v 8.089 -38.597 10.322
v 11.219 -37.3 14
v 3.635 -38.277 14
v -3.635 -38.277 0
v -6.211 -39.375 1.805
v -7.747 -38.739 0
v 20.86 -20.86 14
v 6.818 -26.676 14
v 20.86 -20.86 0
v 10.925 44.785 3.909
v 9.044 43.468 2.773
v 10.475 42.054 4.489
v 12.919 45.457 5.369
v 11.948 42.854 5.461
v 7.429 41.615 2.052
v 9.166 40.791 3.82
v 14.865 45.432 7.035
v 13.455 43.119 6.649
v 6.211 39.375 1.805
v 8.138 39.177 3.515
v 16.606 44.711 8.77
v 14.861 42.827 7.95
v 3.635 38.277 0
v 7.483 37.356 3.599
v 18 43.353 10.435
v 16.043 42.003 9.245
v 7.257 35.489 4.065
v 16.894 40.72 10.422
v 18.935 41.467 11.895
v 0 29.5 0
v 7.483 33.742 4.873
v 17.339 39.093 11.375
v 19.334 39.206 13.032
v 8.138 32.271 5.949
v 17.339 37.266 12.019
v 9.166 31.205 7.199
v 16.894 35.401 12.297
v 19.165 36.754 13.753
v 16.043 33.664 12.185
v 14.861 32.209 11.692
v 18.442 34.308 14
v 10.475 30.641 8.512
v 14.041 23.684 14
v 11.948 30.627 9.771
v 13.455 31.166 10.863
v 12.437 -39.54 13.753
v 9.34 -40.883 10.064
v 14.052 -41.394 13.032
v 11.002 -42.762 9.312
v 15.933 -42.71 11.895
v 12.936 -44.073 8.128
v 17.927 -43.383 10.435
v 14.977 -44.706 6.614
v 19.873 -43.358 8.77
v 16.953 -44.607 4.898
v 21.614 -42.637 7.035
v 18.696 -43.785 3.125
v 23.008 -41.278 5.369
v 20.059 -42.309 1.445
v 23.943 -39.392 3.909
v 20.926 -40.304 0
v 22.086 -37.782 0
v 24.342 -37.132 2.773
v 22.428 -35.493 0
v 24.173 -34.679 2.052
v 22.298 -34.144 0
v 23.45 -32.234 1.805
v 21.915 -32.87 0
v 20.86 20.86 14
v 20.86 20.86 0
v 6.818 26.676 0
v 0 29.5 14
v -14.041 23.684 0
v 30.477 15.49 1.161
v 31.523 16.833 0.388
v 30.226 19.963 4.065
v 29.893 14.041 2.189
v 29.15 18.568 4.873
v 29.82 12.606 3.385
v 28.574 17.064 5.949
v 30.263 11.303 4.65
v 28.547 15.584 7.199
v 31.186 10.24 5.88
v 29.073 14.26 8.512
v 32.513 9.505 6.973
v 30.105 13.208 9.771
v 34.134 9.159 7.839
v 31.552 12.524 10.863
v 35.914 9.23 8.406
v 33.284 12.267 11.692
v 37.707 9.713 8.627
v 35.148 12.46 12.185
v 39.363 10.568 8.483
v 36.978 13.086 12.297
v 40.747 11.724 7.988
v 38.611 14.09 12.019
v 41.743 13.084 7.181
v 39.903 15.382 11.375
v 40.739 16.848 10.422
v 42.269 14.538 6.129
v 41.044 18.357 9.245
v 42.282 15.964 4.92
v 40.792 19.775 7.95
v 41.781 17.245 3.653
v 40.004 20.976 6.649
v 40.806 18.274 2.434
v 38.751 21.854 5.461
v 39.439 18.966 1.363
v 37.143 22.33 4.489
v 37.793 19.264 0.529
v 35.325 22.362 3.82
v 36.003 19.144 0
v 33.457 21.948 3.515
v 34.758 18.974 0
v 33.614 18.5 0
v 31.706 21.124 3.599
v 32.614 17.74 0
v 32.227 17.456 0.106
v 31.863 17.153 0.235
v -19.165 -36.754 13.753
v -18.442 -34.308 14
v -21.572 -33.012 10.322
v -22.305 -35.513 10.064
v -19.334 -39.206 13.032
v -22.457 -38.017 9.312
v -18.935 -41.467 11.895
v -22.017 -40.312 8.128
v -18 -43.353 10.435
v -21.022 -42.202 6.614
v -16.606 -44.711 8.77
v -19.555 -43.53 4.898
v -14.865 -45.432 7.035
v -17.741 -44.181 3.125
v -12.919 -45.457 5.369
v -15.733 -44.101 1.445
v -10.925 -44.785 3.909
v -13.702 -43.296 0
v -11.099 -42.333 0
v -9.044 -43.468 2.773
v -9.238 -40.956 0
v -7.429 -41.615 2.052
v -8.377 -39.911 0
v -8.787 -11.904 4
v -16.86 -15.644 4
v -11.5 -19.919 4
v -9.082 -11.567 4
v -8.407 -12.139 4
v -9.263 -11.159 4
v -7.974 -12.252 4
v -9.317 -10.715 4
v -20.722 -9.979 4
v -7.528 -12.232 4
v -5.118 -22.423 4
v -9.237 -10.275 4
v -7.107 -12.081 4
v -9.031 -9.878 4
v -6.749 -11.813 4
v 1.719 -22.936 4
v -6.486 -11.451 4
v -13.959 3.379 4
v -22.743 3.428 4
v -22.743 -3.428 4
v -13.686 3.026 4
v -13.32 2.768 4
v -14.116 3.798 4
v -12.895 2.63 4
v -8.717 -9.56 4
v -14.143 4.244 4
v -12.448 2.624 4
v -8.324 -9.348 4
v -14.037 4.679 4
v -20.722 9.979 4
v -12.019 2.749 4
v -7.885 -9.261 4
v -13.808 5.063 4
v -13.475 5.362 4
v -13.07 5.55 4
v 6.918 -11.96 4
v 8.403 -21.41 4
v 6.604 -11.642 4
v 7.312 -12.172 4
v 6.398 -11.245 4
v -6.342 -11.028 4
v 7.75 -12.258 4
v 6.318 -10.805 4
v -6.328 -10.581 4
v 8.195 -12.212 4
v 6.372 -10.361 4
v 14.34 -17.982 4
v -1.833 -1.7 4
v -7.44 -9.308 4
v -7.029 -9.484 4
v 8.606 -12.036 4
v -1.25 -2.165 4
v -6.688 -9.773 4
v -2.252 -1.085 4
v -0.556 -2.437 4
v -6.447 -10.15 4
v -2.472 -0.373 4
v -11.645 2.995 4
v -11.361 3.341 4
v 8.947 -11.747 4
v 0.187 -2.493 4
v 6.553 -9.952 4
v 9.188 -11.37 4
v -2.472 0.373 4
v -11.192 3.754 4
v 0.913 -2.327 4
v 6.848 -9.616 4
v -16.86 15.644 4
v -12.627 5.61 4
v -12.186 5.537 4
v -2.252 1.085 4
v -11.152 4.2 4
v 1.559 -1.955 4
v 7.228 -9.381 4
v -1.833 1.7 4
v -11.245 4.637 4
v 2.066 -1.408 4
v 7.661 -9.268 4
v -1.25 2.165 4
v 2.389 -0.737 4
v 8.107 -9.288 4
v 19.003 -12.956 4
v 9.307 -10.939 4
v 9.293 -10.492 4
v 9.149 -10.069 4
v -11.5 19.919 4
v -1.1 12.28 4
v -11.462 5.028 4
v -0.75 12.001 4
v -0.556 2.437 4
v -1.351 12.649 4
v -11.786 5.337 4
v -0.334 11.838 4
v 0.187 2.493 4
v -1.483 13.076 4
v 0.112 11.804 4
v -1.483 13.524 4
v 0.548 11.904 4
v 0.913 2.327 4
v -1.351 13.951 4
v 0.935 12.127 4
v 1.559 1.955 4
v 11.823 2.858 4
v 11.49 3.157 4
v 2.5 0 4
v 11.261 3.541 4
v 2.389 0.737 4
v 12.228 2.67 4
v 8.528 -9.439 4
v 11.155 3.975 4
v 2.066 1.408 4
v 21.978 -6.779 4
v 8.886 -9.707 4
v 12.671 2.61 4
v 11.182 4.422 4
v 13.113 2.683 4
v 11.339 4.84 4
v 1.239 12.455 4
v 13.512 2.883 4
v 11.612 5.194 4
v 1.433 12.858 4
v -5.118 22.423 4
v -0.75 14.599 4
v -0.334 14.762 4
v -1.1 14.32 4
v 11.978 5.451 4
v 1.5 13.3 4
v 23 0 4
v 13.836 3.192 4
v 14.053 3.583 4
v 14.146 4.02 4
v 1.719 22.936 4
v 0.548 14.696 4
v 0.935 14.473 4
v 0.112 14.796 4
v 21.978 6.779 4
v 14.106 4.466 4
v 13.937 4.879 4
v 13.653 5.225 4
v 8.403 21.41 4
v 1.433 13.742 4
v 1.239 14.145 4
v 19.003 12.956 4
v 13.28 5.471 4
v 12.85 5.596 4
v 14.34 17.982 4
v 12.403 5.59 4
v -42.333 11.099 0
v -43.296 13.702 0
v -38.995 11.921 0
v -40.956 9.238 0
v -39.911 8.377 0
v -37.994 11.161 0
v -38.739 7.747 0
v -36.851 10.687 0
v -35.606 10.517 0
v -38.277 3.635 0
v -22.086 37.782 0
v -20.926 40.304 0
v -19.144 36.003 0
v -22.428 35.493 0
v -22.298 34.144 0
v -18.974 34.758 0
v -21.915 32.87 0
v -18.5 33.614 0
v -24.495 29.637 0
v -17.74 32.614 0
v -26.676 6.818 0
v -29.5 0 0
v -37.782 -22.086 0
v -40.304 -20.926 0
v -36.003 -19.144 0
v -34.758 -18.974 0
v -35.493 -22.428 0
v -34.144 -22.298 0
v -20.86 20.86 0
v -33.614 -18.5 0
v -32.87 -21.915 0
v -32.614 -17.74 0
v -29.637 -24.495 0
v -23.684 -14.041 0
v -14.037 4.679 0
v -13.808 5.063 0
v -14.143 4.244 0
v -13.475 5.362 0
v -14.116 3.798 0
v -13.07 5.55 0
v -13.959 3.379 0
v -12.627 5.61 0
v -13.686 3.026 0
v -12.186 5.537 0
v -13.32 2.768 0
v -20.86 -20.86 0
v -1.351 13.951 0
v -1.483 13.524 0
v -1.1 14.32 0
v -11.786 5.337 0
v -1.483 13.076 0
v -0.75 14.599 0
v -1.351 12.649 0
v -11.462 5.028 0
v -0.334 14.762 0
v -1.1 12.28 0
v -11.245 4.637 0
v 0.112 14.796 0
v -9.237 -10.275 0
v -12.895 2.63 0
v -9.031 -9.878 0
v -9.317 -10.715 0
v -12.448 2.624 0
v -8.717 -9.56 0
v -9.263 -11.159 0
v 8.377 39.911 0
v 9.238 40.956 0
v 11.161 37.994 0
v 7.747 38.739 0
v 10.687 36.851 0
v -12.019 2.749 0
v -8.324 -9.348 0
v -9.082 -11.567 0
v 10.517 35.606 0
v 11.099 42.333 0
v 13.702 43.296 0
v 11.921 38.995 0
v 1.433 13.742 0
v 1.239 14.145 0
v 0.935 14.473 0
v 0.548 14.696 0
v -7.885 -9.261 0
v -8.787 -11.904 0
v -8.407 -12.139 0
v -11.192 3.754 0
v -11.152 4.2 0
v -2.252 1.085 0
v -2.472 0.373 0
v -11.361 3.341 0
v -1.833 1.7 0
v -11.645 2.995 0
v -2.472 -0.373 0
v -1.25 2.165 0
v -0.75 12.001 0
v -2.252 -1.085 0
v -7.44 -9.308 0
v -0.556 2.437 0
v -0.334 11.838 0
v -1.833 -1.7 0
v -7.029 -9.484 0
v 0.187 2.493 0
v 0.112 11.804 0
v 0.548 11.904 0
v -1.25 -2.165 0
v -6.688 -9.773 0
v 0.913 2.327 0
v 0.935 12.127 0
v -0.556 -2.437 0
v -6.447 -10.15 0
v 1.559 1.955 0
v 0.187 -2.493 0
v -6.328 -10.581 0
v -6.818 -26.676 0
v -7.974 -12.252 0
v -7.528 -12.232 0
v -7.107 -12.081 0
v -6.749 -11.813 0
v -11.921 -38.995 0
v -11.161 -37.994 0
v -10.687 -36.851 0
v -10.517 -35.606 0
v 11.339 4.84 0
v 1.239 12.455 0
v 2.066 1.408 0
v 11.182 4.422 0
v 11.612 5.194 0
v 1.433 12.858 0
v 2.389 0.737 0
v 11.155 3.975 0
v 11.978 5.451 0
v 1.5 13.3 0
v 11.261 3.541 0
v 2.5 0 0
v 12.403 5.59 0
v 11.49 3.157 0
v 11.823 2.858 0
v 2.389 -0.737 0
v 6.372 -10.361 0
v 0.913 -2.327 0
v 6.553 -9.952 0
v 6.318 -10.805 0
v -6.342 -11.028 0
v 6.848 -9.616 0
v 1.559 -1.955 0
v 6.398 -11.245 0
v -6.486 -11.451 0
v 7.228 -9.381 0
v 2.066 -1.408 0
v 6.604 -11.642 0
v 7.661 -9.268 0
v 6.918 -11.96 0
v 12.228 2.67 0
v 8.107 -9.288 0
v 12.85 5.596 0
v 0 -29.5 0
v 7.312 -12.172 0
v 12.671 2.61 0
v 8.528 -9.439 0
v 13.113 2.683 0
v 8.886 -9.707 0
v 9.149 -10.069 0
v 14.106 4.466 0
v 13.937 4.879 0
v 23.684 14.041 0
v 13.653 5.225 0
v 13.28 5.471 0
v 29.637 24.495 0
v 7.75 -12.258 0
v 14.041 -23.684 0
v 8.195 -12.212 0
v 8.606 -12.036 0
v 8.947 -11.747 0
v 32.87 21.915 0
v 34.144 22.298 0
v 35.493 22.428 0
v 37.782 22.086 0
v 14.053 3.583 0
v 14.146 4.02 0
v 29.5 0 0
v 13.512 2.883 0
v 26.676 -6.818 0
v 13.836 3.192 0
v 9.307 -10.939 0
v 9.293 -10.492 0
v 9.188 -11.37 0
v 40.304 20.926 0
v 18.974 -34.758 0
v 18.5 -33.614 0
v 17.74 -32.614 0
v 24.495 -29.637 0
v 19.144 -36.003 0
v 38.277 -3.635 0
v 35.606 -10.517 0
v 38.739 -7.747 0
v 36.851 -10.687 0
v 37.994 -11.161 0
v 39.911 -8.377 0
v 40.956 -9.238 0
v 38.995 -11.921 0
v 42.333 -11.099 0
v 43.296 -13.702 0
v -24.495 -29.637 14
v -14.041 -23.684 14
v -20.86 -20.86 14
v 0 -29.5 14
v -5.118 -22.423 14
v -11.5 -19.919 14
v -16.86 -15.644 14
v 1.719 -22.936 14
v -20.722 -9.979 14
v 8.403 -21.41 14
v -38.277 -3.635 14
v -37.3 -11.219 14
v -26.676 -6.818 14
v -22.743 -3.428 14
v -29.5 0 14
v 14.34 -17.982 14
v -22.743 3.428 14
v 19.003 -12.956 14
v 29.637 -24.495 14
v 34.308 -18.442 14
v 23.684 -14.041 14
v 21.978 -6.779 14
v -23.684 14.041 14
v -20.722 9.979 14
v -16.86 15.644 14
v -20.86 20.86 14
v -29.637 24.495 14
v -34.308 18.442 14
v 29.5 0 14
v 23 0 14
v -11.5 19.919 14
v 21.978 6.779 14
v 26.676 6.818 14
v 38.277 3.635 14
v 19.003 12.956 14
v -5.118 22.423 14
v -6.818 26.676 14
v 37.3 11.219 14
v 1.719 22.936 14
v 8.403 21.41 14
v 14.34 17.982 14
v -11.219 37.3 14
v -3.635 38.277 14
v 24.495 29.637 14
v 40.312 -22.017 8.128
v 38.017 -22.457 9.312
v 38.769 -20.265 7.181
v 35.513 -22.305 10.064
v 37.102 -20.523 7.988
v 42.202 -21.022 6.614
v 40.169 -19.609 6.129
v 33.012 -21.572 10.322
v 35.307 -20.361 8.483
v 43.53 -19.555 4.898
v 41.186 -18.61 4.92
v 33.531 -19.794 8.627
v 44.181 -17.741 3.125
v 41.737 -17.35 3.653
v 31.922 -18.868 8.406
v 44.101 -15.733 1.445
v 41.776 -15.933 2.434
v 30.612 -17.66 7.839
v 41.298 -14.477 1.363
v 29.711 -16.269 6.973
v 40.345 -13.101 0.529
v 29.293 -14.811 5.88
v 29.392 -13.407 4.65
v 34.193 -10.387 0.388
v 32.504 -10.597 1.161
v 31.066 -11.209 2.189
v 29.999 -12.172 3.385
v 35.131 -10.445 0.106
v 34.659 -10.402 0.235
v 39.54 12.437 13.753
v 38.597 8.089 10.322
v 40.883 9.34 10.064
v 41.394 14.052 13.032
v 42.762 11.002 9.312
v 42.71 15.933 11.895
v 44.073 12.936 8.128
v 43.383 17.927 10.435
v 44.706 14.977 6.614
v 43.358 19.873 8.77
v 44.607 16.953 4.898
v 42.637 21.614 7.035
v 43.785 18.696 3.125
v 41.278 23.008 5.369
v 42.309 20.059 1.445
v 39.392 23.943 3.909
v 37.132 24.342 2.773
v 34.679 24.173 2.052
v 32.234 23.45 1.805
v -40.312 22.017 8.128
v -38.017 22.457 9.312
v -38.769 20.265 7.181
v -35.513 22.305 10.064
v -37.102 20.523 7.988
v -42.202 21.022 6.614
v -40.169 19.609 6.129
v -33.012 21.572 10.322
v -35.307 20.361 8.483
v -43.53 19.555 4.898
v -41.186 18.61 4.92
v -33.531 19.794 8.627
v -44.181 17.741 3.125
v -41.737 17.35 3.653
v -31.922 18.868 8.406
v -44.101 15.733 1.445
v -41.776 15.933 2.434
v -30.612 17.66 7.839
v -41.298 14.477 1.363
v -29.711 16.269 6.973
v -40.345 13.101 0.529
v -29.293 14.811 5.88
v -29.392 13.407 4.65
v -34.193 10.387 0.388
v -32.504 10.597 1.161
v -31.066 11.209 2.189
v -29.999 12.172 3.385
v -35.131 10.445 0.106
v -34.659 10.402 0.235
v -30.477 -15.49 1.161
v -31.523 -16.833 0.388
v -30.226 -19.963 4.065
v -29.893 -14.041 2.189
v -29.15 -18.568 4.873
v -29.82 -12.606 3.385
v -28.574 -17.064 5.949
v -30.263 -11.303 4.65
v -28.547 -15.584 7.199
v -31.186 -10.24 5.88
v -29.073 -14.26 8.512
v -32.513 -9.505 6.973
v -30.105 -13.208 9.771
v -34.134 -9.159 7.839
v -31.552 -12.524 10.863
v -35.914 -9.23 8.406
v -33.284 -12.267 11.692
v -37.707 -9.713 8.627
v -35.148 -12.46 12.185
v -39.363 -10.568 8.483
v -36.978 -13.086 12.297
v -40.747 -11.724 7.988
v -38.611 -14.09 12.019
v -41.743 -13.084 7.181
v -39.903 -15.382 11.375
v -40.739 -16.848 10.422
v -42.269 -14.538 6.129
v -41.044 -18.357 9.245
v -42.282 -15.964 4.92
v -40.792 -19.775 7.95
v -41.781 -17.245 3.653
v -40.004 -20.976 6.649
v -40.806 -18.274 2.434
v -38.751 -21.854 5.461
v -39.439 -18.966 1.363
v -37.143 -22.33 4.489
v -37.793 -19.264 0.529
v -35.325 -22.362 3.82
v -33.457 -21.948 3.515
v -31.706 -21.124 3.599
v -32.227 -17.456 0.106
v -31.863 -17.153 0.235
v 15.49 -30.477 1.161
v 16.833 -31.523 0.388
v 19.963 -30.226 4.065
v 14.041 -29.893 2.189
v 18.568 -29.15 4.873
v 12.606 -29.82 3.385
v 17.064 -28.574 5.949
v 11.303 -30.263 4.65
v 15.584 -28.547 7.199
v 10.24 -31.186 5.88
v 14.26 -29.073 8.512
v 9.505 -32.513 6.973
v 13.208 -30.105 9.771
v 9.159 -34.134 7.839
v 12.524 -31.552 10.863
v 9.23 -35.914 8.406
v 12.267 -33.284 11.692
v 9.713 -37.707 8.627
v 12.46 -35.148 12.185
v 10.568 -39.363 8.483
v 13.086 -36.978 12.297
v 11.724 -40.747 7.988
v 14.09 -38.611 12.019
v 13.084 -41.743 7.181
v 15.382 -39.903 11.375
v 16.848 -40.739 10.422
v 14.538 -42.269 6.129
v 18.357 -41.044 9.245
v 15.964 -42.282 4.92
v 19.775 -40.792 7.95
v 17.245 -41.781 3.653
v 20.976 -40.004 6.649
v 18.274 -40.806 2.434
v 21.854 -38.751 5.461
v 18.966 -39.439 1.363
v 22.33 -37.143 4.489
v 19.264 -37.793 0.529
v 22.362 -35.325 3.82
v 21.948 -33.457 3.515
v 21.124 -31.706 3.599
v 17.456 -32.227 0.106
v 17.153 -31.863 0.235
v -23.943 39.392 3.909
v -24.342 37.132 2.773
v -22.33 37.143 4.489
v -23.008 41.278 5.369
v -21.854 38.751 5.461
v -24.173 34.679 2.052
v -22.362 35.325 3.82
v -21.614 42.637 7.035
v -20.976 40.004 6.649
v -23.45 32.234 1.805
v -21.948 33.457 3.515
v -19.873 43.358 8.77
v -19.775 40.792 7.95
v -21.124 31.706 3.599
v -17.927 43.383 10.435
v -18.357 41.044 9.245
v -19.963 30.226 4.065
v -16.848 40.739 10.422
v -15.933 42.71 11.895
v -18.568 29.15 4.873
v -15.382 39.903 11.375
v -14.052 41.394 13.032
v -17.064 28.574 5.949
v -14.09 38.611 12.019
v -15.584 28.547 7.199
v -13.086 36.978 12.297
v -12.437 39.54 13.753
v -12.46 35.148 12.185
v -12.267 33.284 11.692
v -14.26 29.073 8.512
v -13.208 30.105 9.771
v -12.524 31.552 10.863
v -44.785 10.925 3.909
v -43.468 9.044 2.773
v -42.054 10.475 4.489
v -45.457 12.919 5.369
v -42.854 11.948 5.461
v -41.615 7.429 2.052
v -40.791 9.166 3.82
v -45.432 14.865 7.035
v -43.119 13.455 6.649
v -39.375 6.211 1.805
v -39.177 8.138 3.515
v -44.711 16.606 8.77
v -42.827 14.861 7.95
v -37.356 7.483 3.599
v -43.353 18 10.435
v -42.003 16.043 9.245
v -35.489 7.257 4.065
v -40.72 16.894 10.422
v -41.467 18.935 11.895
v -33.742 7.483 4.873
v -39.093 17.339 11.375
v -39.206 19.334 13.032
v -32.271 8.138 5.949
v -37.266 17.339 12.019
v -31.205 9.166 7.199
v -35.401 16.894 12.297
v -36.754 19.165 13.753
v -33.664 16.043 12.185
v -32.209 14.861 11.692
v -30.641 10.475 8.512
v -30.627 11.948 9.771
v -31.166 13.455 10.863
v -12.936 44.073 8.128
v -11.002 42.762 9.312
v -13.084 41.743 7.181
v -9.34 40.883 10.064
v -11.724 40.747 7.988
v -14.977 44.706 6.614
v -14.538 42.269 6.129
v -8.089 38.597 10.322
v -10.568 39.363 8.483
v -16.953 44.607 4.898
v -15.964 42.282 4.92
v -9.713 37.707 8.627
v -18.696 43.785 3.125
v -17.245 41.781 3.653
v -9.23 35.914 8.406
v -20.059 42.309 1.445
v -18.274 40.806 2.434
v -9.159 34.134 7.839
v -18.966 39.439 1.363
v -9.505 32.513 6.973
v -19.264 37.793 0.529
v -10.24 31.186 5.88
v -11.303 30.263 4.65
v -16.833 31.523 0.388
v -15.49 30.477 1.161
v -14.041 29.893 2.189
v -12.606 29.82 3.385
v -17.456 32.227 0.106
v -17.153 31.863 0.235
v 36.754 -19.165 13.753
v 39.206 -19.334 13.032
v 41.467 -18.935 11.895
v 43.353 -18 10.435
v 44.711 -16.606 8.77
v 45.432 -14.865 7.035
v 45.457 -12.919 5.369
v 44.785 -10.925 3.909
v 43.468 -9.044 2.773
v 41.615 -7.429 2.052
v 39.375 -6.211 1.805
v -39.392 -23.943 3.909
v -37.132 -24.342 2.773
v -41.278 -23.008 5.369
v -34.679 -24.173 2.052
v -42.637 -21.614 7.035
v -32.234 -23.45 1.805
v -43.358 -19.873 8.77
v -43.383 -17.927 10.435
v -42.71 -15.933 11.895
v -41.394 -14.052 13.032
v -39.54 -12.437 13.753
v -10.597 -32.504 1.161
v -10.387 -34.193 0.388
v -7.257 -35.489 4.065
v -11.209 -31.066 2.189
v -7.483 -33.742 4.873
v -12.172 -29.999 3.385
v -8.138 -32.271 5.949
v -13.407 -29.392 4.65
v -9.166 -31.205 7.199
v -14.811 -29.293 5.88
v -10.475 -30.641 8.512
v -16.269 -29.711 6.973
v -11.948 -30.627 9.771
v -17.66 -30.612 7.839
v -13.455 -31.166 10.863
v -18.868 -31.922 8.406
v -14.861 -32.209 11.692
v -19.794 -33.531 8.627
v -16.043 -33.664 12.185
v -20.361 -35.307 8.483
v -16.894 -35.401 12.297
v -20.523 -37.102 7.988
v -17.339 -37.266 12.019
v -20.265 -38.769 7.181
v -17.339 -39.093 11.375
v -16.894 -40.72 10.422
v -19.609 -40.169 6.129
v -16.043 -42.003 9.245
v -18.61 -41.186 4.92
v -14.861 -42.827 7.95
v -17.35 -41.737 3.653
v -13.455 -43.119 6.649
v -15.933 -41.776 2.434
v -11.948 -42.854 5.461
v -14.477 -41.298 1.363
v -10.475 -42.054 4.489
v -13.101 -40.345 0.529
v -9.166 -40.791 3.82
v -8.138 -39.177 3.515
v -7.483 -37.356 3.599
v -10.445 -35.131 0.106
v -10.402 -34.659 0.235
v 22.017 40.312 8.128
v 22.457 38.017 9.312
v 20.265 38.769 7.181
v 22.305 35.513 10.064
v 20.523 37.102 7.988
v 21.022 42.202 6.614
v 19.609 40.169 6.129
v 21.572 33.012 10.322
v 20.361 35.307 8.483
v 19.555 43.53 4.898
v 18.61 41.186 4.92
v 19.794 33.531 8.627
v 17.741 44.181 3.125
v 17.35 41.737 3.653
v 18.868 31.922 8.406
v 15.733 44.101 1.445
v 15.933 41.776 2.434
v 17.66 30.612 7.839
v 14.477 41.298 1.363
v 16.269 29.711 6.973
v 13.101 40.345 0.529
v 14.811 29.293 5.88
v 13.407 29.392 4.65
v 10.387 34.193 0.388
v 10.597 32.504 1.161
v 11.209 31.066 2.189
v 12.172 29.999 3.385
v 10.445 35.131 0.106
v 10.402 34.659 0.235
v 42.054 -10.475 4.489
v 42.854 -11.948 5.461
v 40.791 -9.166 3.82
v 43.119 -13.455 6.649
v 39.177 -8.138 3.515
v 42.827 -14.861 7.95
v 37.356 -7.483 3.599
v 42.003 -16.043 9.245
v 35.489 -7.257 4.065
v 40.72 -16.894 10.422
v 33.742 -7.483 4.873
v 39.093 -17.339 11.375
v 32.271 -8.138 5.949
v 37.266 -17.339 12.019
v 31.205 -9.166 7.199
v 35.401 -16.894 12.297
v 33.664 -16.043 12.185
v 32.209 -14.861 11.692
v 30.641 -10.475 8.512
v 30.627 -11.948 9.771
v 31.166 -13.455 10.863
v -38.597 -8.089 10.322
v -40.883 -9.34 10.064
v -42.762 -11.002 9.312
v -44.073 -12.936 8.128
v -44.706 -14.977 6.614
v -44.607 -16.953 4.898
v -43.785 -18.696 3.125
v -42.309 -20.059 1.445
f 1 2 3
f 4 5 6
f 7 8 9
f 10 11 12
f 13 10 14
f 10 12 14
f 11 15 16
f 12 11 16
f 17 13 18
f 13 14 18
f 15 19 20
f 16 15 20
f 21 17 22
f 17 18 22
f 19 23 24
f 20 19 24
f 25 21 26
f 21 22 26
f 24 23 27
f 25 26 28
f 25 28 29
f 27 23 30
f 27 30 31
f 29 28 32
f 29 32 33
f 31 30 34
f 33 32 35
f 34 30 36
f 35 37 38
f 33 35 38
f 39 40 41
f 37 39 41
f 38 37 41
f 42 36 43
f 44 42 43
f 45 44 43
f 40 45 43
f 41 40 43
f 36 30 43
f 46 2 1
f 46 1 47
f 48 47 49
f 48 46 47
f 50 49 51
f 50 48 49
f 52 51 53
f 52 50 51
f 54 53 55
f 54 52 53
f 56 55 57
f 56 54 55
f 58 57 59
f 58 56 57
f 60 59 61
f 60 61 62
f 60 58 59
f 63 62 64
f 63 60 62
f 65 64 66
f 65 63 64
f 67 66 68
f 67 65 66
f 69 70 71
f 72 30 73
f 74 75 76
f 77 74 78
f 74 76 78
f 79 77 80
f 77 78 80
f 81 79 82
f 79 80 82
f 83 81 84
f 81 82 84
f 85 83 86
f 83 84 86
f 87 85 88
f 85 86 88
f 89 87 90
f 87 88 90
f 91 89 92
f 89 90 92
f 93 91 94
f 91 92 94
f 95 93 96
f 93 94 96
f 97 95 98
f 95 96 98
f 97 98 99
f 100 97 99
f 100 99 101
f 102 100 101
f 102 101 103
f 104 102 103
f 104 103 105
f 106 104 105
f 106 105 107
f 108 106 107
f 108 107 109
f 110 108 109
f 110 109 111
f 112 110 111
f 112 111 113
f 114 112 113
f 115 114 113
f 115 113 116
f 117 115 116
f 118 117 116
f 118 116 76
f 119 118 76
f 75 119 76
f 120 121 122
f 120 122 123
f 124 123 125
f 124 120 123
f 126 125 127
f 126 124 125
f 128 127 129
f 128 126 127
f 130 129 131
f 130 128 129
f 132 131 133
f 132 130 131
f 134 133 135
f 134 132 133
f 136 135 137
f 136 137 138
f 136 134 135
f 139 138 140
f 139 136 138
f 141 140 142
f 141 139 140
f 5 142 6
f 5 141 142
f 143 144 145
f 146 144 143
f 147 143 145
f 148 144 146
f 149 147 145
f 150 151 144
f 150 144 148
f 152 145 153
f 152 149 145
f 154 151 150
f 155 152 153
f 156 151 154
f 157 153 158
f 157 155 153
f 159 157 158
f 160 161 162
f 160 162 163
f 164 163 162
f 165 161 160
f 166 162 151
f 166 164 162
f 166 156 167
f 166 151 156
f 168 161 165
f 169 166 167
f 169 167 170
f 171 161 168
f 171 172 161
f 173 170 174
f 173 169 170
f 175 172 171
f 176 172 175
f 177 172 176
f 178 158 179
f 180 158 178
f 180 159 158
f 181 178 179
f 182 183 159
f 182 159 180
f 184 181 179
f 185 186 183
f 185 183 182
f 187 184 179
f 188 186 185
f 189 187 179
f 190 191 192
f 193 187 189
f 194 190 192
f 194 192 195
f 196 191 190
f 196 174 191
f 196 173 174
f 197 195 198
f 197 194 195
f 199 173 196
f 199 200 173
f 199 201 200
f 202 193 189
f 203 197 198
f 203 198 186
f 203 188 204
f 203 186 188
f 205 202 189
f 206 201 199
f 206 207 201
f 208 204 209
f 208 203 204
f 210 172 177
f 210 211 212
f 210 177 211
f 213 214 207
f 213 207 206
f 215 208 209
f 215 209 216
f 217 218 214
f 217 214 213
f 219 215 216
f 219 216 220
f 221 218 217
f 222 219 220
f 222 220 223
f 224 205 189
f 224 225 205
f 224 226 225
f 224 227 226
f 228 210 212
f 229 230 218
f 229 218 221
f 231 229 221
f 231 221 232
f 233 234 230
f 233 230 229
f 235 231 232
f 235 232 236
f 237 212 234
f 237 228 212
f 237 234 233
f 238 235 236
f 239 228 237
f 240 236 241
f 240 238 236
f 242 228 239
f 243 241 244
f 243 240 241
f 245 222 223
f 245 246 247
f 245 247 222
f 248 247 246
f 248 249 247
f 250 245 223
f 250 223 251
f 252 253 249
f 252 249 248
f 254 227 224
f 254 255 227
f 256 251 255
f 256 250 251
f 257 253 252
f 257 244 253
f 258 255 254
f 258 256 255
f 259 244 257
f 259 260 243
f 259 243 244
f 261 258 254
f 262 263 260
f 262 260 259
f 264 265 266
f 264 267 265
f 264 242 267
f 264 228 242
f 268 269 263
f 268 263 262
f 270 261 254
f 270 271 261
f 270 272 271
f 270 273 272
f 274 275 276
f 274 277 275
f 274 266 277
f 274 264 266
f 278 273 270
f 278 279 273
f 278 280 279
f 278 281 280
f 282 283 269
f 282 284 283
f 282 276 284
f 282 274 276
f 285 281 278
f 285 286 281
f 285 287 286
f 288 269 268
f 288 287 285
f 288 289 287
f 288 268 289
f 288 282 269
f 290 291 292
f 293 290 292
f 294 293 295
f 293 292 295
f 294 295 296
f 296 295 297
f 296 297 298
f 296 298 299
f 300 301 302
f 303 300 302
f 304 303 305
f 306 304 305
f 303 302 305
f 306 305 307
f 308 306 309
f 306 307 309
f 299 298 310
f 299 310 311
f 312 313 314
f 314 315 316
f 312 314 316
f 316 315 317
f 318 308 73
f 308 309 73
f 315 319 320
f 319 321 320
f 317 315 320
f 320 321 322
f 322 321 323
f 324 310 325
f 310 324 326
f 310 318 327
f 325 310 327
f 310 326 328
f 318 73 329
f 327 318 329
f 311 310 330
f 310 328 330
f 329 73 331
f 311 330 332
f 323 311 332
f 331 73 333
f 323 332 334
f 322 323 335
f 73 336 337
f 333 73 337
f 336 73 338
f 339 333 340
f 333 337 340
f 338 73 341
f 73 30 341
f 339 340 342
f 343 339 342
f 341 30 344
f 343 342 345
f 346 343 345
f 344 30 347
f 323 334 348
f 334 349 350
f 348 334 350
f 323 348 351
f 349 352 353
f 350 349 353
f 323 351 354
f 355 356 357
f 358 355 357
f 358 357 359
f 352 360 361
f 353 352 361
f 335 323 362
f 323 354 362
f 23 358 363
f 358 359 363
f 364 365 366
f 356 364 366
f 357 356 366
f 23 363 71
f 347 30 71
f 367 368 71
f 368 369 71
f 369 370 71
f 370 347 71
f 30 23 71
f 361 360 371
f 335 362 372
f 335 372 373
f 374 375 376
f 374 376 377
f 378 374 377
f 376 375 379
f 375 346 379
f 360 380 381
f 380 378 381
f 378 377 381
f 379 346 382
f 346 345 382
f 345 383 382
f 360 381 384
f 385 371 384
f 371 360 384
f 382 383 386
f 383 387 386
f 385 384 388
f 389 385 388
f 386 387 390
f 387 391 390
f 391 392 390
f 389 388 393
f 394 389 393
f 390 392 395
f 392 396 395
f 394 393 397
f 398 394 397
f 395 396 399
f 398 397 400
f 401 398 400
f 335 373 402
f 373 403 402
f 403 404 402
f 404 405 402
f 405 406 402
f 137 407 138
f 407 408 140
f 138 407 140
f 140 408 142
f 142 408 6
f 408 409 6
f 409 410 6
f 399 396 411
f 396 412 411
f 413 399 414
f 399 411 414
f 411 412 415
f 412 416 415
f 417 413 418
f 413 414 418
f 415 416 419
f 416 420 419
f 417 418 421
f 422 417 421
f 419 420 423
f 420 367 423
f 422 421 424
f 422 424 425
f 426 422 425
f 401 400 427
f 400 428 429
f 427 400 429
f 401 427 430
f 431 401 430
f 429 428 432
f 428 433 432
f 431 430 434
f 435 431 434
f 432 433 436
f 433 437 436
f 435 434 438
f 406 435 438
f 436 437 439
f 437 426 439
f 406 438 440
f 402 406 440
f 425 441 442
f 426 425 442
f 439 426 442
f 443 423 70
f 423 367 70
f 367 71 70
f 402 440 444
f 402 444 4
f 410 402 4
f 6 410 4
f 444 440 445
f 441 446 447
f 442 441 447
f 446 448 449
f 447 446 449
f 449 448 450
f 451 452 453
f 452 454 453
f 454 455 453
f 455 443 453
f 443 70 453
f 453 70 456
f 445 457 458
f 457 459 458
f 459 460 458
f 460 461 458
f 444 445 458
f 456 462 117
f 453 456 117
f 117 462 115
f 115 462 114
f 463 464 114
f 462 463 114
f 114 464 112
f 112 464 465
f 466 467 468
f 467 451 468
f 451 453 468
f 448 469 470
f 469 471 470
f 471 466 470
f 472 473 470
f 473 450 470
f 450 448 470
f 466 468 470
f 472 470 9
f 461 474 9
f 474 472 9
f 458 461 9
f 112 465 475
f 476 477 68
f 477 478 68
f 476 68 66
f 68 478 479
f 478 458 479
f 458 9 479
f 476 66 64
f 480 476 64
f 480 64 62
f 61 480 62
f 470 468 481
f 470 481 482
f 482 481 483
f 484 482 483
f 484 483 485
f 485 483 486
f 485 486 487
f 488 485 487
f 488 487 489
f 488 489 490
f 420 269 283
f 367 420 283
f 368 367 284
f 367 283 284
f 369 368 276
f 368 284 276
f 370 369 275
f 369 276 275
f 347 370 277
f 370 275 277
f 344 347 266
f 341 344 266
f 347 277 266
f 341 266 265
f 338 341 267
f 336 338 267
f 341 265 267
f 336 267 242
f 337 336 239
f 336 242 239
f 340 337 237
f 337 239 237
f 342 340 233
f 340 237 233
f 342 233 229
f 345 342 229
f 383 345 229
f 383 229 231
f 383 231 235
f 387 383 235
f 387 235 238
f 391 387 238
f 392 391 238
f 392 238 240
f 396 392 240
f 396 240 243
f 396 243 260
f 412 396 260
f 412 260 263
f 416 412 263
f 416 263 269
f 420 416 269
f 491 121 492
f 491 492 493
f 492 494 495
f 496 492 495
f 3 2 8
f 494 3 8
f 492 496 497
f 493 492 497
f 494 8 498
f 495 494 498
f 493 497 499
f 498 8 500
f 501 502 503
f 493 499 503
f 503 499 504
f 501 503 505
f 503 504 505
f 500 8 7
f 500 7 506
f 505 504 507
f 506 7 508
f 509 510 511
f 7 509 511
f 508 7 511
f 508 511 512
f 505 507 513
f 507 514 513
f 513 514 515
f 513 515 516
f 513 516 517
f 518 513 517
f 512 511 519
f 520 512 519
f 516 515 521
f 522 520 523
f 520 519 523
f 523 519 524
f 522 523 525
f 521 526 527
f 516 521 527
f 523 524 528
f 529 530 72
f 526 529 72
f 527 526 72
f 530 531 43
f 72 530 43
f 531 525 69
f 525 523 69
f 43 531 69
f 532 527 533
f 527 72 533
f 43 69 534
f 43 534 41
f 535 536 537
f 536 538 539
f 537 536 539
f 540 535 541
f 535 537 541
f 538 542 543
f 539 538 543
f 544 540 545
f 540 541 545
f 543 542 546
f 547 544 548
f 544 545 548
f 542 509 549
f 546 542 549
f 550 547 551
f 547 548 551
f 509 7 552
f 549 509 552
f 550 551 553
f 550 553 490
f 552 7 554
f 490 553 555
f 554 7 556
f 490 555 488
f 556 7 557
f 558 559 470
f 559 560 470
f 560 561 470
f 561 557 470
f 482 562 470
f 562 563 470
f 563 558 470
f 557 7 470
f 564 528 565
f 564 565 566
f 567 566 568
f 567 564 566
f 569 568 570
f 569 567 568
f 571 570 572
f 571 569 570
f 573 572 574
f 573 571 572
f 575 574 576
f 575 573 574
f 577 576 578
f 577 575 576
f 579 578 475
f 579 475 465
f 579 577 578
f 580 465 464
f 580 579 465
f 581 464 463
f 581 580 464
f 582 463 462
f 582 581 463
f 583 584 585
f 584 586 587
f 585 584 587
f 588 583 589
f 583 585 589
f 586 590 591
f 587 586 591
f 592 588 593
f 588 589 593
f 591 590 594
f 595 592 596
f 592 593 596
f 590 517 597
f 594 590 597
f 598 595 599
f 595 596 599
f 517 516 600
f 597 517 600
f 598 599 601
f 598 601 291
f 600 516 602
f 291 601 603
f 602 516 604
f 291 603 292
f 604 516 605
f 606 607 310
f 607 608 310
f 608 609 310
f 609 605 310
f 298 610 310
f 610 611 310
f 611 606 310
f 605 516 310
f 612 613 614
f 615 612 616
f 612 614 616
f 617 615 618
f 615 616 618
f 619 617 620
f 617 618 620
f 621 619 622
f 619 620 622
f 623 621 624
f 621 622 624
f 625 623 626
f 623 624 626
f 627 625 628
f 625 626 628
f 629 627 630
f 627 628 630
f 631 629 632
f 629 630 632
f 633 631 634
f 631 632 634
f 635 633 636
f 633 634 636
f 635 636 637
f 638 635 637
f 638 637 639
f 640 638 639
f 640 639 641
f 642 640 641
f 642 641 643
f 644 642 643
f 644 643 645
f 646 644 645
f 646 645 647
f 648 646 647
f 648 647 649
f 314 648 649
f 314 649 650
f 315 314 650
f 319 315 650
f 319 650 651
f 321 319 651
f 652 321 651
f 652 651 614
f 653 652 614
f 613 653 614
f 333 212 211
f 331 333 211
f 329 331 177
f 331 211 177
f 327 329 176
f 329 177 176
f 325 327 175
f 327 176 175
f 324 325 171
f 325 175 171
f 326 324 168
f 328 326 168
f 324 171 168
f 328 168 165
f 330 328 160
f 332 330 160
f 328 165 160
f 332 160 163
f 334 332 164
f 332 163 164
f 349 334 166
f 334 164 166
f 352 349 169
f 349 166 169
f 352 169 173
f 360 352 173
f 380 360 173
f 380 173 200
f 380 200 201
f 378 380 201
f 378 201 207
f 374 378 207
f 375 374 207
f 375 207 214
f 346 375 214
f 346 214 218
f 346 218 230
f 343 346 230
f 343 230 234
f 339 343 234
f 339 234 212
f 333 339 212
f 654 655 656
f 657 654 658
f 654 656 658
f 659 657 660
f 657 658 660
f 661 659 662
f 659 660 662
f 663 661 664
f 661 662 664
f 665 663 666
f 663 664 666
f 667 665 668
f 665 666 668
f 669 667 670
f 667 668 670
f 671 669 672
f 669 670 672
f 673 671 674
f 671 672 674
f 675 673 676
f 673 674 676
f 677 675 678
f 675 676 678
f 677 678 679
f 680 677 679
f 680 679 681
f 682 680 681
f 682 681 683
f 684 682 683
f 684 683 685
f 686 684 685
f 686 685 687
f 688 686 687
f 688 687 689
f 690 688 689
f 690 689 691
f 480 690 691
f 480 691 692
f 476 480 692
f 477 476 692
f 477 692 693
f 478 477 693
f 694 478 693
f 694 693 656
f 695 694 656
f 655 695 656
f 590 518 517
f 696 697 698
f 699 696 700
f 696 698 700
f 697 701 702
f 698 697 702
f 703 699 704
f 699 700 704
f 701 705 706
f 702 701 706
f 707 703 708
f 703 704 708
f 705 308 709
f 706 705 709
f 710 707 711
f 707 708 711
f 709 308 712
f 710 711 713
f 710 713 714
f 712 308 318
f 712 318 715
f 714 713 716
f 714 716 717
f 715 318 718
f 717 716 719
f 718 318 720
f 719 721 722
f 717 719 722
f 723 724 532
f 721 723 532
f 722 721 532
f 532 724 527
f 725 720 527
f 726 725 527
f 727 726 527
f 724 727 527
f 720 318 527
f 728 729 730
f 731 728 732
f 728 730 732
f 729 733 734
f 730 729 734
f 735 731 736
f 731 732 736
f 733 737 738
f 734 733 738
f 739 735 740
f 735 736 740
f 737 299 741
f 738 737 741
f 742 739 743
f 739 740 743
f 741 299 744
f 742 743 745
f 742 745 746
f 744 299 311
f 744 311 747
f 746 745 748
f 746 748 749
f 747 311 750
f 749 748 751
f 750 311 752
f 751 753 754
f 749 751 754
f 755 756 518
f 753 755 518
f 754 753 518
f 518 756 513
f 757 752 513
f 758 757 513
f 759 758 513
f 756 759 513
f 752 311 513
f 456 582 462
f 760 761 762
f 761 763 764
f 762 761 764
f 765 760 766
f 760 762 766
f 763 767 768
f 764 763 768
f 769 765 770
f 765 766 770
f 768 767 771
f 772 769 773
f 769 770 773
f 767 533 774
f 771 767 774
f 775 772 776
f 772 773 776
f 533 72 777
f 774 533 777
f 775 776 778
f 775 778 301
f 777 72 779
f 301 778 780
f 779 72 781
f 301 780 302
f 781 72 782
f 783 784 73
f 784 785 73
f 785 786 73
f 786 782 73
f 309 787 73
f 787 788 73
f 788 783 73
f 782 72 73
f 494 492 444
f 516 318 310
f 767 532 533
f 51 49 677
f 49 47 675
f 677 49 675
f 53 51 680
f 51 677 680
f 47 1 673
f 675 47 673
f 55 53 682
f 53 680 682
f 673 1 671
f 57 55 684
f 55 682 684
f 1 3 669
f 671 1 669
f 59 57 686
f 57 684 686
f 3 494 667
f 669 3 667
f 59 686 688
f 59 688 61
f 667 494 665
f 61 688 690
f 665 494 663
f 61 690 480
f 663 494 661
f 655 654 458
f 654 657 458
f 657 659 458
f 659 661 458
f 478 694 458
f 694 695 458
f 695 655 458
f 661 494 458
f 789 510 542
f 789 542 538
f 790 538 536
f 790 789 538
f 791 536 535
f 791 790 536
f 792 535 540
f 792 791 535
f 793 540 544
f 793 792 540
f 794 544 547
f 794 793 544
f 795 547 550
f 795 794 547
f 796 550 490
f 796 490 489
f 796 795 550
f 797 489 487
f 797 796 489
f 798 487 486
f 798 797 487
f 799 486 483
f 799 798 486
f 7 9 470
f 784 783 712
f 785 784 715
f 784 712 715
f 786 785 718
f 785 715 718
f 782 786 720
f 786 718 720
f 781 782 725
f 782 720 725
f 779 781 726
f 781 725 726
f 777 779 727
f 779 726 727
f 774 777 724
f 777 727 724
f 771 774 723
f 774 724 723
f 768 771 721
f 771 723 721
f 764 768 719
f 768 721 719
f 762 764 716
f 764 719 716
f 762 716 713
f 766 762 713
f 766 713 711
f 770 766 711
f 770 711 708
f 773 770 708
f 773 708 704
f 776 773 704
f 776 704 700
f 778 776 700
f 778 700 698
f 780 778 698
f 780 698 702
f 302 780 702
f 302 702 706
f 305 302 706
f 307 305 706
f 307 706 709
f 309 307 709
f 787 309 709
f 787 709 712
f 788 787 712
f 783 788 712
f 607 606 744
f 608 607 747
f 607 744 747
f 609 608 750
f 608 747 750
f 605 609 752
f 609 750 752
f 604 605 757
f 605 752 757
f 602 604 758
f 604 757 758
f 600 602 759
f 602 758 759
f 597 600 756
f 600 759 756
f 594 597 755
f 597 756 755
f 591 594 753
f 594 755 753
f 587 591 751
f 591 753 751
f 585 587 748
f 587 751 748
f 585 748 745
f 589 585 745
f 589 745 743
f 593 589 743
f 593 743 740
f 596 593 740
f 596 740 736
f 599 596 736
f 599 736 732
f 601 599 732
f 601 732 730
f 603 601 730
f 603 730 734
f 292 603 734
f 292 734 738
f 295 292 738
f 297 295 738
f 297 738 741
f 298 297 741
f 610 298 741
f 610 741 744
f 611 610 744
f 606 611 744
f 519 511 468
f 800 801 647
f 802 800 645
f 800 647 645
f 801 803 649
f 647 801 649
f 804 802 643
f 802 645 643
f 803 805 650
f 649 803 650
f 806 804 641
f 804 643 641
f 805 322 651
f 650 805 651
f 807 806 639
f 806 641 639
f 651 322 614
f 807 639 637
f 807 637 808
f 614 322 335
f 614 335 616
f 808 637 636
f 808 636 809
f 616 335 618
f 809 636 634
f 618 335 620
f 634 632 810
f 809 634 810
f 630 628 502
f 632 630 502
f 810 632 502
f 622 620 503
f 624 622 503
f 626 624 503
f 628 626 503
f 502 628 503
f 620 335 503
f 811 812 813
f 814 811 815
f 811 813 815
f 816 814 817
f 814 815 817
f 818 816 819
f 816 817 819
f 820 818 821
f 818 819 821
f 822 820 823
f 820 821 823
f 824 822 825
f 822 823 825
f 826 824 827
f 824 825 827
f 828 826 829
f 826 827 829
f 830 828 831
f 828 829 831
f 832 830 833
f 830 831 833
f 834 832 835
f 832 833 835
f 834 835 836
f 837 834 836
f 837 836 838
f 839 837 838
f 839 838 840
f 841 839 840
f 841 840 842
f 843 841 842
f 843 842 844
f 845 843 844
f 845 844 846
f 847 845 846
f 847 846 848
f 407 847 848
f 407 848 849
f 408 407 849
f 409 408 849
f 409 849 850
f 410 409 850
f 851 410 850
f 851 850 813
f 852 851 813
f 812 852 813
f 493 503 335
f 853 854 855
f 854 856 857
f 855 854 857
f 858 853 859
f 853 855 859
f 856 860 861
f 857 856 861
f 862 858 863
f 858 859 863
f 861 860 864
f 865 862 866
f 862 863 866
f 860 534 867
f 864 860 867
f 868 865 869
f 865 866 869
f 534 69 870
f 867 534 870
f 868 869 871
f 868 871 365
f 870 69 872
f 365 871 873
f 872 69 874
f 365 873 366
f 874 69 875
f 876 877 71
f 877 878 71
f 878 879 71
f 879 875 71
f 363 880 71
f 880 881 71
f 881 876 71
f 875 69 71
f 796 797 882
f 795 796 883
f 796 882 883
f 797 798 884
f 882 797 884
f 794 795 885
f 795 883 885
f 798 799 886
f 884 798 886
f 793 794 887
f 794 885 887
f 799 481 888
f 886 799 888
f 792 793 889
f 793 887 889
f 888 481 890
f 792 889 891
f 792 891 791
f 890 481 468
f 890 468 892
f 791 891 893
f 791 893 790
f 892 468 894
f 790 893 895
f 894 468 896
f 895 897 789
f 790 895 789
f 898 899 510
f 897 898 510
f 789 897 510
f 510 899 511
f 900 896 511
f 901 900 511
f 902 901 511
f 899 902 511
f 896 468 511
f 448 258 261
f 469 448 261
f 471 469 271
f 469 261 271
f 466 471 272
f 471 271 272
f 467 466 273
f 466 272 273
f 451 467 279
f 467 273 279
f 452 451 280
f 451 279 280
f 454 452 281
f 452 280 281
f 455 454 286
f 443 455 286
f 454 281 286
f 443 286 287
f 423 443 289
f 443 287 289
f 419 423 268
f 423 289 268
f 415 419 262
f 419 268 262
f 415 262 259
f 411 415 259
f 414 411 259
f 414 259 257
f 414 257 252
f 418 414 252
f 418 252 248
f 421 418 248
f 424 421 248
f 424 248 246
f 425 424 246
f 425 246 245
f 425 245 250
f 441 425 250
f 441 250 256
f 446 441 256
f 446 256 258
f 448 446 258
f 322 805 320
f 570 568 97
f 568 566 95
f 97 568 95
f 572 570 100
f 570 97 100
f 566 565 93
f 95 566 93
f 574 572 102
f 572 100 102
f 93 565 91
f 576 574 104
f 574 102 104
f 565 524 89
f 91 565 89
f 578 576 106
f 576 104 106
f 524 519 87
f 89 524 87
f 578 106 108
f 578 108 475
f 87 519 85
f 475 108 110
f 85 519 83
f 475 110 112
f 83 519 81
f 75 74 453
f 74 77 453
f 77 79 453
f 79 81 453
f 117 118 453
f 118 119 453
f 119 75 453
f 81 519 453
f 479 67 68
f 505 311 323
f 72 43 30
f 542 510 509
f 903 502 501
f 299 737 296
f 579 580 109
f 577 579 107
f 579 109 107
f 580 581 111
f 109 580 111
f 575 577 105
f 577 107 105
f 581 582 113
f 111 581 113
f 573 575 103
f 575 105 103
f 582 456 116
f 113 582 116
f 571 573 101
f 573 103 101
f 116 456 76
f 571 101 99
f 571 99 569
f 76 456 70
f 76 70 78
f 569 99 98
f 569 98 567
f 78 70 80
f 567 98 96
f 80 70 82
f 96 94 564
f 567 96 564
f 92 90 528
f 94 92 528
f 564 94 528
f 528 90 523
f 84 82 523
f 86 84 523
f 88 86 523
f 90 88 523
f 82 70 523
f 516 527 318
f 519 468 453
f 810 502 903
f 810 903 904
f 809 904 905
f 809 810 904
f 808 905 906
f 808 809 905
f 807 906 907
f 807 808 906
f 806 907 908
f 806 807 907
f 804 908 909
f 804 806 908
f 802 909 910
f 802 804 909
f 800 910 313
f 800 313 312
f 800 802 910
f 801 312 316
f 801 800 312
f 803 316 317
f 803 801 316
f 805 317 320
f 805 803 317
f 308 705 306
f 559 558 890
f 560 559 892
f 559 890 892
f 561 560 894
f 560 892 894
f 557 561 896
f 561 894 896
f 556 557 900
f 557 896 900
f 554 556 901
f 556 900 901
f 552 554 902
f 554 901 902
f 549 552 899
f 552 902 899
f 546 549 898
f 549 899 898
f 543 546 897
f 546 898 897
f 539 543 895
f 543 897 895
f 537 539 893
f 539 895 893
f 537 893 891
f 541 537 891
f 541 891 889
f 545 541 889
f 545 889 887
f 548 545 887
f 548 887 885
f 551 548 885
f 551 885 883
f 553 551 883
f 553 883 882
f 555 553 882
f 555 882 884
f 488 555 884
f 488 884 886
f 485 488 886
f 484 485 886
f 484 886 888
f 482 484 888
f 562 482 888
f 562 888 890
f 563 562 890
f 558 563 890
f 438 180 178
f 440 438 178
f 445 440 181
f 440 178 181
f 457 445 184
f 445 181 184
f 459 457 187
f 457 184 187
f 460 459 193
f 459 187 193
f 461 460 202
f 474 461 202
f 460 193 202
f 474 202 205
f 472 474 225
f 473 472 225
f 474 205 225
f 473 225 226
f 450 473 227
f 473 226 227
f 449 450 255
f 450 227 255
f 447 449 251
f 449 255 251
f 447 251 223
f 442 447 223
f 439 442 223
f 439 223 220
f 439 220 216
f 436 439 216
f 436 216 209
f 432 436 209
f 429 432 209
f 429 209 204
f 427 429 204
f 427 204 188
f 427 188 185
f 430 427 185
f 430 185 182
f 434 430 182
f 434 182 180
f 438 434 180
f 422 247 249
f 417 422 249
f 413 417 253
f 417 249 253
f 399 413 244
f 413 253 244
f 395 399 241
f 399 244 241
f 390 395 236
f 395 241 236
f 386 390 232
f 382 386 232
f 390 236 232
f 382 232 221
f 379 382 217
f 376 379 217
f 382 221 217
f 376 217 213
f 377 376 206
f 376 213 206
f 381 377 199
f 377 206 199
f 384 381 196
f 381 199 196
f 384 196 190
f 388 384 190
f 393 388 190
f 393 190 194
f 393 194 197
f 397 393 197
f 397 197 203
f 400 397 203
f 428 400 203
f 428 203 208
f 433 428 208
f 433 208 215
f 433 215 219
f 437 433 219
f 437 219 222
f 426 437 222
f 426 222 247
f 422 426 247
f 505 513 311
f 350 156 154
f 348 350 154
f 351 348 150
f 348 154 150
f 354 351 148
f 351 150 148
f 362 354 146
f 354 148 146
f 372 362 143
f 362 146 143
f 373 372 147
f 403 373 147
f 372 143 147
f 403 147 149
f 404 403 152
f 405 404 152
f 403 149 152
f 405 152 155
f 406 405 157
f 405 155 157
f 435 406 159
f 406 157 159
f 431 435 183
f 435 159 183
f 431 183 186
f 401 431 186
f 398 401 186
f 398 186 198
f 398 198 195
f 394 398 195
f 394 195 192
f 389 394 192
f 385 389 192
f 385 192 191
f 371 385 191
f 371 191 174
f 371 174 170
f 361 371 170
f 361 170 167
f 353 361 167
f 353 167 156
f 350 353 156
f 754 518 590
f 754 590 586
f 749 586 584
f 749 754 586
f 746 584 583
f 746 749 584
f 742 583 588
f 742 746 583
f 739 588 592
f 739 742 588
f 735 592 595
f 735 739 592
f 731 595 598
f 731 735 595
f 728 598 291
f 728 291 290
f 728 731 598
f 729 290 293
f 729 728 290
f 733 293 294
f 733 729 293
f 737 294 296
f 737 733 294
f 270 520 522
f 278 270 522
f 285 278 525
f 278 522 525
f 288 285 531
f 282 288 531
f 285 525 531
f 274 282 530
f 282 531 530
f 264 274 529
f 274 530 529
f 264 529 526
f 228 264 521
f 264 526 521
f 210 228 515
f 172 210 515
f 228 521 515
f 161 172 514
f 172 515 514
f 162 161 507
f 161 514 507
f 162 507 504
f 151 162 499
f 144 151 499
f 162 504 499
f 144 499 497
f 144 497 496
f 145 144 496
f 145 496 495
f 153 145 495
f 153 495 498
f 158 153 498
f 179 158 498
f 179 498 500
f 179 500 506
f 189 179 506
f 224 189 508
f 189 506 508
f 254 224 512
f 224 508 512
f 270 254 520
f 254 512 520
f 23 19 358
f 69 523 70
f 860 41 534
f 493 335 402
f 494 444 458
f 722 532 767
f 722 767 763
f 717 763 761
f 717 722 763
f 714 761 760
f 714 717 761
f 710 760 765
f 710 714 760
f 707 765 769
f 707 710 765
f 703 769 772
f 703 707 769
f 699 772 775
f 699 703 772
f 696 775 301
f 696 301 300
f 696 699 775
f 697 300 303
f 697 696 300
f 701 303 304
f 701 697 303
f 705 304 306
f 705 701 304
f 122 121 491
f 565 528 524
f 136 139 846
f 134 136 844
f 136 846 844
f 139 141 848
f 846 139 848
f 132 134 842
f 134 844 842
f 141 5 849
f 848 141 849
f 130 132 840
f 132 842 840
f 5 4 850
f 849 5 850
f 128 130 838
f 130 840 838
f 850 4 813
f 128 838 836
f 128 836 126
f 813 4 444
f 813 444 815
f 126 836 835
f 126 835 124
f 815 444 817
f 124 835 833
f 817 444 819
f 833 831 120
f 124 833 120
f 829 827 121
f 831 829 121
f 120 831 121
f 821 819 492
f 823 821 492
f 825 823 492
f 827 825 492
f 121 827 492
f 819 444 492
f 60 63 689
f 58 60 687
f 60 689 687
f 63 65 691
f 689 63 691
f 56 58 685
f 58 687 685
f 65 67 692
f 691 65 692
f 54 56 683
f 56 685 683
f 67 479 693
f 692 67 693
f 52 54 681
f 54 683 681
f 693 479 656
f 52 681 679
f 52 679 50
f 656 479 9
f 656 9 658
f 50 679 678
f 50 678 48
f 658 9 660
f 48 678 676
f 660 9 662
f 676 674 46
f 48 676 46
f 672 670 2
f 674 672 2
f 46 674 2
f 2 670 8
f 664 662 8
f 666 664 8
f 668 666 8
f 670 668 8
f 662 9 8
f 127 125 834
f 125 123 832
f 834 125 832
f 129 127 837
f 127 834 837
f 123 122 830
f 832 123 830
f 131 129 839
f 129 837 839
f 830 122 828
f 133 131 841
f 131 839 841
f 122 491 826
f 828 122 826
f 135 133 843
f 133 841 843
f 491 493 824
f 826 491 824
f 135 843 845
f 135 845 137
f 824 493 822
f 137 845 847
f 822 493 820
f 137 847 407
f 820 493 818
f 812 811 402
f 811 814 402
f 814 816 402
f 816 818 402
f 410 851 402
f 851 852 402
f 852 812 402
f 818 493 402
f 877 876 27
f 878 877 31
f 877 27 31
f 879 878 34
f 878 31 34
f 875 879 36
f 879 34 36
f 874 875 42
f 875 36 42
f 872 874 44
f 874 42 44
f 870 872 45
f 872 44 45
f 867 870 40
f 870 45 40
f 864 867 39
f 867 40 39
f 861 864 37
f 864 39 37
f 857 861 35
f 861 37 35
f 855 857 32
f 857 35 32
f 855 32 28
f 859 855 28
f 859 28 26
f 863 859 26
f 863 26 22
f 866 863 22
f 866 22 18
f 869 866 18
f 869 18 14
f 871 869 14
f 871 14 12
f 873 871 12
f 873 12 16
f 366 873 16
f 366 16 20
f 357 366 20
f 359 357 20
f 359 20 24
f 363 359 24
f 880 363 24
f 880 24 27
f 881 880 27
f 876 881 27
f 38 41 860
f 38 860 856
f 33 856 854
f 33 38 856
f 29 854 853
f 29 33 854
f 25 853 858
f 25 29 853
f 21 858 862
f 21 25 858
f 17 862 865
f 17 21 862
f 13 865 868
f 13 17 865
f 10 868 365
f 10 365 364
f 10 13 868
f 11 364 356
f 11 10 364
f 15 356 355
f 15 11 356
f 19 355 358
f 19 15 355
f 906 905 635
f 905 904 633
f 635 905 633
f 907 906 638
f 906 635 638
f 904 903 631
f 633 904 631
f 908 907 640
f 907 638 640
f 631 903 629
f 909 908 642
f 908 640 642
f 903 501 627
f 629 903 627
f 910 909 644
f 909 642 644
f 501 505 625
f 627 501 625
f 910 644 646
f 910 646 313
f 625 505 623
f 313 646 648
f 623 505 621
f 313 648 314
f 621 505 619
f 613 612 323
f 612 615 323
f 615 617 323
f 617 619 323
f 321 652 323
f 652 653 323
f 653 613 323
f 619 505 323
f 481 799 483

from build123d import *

# Parameters (mm, degrees)
PAD_DEPTH             = 14
SKETCH001_R           = 23
POCKET_DEPTH          = 10
SKETCH002_R           = 2.5
SKETCH002_R_2         = 1.5
POCKET001_DEPTH       = 173.2109287867
POLARPATTERN_COUNT    = 5
PAD001_DEPTH          = 21
POLARPATTERN001_COUNT = 8
SKETCH004_R           = 6.5
POCKET002_DEPTH       = 5
POLARPATTERN002_COUNT = 8


with BuildPart() as part:
    # Sketch → Pad (new body)
    with BuildSketch(Plane.XY):
        Polygon((29.5, 0), (20.859650045, 20.859650045), (0, 29.5), (-20.859650045, 20.859650045), (-29.5, 0), (-20.859650045, -20.859650045), (0, -29.5), (20.859650045, -20.859650045), align=None)
    extrude(amount=PAD_DEPTH)

    # Sketch001 (on Face10 of Pad) → Pocket (cut)
    with BuildSketch(Plane.XY.offset(14)):
        Circle(SKETCH001_R)
    extrude(amount=-POCKET_DEPTH, mode=Mode.SUBTRACT)

    # Sketch002 (on Face12 of Pocket) → Pocket001 (cut, through all)
    with BuildSketch(Plane.XY.offset(4)):
        Circle(SKETCH002_R)
        with Locations((0, 13.3)):
            Circle(SKETCH002_R_2)
    pocket001 = extrude(amount=-POCKET001_DEPTH, mode=Mode.SUBTRACT)

    # PolarPattern: Pocket001 ×5 about axis
    polarpattern_axis = Axis((0, 0, 4), (0, 0, 1))
    for i in range(1, POLARPATTERN_COUNT):
        add(pocket001.rotate(polarpattern_axis, i * 360 / POLARPATTERN_COUNT), mode=Mode.SUBTRACT)

    # Sketch003 (on Face8 of PolarPattern) → Pad001 (join)
    with BuildSketch(Plane(origin=(-10.4298250225, -25.1798250225, 0), x_dir=(0.9238795325, -0.3826834324, 0), z_dir=(-0.3826834324, -0.9238795325, 0))):
        Polygon((-11.2891612548, 14), (3.9092426218, 0), (11.2891612548, 0), (-3.9092426218, 14), align=None)
    pad001 = extrude(amount=PAD001_DEPTH)

    # PolarPattern001: Pad001 ×8 about axis
    polarpattern001_axis = Axis((0, 0, 0), (0, 0, 1))
    for i in range(1, POLARPATTERN001_COUNT):
        add(pad001.rotate(polarpattern001_axis, i * 360 / POLARPATTERN001_COUNT))

    # Sketch004 (on Face52 of PolarPattern001) → Pocket002 (cut)
    with BuildSketch(Plane(origin=(4.7875561885, -1.9830707039, 5.6255952654), x_dir=(0.7798699787, 0.208098843, -0.5903369274), z_dir=(0.6259415438, -0.2592734767, 0.7355096519))):
        with Locations((-21.9449518208, -32.1188270446)):
            Circle(SKETCH004_R)
        with BuildLine():
            Line((-14.1030025385, -36.5351412832), (-10.8005808993, -36.0996031065))
            Line((-10.8005808993, -36.0996031065), (-16.4436490931, -46.1198716338))
            Line((-16.4436490931, -46.1198716338), (-39.1781340839, -33.3165970703))
            Line((-33.5350658901, -23.296328543), (-39.1781340839, -33.3165970703))
            Line((-29.786901103, -27.7025128059), (-33.5350658901, -23.296328543))
            ThreePointArc((-29.786901103, -27.7025128059), (-26.3612660594, -39.9607763268), (-14.1030025385, -36.5351412832))
        make_face()
    pocket002 = extrude(amount=-POCKET002_DEPTH, mode=Mode.SUBTRACT)

    # PolarPattern002: Pocket002 ×8 about axis
    polarpattern002_axis = Axis((0, 0, 0), (0, 0, 1))
    for i in range(1, POLARPATTERN002_COUNT):
        add(pocket002.rotate(polarpattern002_axis, i * 360 / POLARPATTERN002_COUNT), mode=Mode.SUBTRACT)


solid = part.part
